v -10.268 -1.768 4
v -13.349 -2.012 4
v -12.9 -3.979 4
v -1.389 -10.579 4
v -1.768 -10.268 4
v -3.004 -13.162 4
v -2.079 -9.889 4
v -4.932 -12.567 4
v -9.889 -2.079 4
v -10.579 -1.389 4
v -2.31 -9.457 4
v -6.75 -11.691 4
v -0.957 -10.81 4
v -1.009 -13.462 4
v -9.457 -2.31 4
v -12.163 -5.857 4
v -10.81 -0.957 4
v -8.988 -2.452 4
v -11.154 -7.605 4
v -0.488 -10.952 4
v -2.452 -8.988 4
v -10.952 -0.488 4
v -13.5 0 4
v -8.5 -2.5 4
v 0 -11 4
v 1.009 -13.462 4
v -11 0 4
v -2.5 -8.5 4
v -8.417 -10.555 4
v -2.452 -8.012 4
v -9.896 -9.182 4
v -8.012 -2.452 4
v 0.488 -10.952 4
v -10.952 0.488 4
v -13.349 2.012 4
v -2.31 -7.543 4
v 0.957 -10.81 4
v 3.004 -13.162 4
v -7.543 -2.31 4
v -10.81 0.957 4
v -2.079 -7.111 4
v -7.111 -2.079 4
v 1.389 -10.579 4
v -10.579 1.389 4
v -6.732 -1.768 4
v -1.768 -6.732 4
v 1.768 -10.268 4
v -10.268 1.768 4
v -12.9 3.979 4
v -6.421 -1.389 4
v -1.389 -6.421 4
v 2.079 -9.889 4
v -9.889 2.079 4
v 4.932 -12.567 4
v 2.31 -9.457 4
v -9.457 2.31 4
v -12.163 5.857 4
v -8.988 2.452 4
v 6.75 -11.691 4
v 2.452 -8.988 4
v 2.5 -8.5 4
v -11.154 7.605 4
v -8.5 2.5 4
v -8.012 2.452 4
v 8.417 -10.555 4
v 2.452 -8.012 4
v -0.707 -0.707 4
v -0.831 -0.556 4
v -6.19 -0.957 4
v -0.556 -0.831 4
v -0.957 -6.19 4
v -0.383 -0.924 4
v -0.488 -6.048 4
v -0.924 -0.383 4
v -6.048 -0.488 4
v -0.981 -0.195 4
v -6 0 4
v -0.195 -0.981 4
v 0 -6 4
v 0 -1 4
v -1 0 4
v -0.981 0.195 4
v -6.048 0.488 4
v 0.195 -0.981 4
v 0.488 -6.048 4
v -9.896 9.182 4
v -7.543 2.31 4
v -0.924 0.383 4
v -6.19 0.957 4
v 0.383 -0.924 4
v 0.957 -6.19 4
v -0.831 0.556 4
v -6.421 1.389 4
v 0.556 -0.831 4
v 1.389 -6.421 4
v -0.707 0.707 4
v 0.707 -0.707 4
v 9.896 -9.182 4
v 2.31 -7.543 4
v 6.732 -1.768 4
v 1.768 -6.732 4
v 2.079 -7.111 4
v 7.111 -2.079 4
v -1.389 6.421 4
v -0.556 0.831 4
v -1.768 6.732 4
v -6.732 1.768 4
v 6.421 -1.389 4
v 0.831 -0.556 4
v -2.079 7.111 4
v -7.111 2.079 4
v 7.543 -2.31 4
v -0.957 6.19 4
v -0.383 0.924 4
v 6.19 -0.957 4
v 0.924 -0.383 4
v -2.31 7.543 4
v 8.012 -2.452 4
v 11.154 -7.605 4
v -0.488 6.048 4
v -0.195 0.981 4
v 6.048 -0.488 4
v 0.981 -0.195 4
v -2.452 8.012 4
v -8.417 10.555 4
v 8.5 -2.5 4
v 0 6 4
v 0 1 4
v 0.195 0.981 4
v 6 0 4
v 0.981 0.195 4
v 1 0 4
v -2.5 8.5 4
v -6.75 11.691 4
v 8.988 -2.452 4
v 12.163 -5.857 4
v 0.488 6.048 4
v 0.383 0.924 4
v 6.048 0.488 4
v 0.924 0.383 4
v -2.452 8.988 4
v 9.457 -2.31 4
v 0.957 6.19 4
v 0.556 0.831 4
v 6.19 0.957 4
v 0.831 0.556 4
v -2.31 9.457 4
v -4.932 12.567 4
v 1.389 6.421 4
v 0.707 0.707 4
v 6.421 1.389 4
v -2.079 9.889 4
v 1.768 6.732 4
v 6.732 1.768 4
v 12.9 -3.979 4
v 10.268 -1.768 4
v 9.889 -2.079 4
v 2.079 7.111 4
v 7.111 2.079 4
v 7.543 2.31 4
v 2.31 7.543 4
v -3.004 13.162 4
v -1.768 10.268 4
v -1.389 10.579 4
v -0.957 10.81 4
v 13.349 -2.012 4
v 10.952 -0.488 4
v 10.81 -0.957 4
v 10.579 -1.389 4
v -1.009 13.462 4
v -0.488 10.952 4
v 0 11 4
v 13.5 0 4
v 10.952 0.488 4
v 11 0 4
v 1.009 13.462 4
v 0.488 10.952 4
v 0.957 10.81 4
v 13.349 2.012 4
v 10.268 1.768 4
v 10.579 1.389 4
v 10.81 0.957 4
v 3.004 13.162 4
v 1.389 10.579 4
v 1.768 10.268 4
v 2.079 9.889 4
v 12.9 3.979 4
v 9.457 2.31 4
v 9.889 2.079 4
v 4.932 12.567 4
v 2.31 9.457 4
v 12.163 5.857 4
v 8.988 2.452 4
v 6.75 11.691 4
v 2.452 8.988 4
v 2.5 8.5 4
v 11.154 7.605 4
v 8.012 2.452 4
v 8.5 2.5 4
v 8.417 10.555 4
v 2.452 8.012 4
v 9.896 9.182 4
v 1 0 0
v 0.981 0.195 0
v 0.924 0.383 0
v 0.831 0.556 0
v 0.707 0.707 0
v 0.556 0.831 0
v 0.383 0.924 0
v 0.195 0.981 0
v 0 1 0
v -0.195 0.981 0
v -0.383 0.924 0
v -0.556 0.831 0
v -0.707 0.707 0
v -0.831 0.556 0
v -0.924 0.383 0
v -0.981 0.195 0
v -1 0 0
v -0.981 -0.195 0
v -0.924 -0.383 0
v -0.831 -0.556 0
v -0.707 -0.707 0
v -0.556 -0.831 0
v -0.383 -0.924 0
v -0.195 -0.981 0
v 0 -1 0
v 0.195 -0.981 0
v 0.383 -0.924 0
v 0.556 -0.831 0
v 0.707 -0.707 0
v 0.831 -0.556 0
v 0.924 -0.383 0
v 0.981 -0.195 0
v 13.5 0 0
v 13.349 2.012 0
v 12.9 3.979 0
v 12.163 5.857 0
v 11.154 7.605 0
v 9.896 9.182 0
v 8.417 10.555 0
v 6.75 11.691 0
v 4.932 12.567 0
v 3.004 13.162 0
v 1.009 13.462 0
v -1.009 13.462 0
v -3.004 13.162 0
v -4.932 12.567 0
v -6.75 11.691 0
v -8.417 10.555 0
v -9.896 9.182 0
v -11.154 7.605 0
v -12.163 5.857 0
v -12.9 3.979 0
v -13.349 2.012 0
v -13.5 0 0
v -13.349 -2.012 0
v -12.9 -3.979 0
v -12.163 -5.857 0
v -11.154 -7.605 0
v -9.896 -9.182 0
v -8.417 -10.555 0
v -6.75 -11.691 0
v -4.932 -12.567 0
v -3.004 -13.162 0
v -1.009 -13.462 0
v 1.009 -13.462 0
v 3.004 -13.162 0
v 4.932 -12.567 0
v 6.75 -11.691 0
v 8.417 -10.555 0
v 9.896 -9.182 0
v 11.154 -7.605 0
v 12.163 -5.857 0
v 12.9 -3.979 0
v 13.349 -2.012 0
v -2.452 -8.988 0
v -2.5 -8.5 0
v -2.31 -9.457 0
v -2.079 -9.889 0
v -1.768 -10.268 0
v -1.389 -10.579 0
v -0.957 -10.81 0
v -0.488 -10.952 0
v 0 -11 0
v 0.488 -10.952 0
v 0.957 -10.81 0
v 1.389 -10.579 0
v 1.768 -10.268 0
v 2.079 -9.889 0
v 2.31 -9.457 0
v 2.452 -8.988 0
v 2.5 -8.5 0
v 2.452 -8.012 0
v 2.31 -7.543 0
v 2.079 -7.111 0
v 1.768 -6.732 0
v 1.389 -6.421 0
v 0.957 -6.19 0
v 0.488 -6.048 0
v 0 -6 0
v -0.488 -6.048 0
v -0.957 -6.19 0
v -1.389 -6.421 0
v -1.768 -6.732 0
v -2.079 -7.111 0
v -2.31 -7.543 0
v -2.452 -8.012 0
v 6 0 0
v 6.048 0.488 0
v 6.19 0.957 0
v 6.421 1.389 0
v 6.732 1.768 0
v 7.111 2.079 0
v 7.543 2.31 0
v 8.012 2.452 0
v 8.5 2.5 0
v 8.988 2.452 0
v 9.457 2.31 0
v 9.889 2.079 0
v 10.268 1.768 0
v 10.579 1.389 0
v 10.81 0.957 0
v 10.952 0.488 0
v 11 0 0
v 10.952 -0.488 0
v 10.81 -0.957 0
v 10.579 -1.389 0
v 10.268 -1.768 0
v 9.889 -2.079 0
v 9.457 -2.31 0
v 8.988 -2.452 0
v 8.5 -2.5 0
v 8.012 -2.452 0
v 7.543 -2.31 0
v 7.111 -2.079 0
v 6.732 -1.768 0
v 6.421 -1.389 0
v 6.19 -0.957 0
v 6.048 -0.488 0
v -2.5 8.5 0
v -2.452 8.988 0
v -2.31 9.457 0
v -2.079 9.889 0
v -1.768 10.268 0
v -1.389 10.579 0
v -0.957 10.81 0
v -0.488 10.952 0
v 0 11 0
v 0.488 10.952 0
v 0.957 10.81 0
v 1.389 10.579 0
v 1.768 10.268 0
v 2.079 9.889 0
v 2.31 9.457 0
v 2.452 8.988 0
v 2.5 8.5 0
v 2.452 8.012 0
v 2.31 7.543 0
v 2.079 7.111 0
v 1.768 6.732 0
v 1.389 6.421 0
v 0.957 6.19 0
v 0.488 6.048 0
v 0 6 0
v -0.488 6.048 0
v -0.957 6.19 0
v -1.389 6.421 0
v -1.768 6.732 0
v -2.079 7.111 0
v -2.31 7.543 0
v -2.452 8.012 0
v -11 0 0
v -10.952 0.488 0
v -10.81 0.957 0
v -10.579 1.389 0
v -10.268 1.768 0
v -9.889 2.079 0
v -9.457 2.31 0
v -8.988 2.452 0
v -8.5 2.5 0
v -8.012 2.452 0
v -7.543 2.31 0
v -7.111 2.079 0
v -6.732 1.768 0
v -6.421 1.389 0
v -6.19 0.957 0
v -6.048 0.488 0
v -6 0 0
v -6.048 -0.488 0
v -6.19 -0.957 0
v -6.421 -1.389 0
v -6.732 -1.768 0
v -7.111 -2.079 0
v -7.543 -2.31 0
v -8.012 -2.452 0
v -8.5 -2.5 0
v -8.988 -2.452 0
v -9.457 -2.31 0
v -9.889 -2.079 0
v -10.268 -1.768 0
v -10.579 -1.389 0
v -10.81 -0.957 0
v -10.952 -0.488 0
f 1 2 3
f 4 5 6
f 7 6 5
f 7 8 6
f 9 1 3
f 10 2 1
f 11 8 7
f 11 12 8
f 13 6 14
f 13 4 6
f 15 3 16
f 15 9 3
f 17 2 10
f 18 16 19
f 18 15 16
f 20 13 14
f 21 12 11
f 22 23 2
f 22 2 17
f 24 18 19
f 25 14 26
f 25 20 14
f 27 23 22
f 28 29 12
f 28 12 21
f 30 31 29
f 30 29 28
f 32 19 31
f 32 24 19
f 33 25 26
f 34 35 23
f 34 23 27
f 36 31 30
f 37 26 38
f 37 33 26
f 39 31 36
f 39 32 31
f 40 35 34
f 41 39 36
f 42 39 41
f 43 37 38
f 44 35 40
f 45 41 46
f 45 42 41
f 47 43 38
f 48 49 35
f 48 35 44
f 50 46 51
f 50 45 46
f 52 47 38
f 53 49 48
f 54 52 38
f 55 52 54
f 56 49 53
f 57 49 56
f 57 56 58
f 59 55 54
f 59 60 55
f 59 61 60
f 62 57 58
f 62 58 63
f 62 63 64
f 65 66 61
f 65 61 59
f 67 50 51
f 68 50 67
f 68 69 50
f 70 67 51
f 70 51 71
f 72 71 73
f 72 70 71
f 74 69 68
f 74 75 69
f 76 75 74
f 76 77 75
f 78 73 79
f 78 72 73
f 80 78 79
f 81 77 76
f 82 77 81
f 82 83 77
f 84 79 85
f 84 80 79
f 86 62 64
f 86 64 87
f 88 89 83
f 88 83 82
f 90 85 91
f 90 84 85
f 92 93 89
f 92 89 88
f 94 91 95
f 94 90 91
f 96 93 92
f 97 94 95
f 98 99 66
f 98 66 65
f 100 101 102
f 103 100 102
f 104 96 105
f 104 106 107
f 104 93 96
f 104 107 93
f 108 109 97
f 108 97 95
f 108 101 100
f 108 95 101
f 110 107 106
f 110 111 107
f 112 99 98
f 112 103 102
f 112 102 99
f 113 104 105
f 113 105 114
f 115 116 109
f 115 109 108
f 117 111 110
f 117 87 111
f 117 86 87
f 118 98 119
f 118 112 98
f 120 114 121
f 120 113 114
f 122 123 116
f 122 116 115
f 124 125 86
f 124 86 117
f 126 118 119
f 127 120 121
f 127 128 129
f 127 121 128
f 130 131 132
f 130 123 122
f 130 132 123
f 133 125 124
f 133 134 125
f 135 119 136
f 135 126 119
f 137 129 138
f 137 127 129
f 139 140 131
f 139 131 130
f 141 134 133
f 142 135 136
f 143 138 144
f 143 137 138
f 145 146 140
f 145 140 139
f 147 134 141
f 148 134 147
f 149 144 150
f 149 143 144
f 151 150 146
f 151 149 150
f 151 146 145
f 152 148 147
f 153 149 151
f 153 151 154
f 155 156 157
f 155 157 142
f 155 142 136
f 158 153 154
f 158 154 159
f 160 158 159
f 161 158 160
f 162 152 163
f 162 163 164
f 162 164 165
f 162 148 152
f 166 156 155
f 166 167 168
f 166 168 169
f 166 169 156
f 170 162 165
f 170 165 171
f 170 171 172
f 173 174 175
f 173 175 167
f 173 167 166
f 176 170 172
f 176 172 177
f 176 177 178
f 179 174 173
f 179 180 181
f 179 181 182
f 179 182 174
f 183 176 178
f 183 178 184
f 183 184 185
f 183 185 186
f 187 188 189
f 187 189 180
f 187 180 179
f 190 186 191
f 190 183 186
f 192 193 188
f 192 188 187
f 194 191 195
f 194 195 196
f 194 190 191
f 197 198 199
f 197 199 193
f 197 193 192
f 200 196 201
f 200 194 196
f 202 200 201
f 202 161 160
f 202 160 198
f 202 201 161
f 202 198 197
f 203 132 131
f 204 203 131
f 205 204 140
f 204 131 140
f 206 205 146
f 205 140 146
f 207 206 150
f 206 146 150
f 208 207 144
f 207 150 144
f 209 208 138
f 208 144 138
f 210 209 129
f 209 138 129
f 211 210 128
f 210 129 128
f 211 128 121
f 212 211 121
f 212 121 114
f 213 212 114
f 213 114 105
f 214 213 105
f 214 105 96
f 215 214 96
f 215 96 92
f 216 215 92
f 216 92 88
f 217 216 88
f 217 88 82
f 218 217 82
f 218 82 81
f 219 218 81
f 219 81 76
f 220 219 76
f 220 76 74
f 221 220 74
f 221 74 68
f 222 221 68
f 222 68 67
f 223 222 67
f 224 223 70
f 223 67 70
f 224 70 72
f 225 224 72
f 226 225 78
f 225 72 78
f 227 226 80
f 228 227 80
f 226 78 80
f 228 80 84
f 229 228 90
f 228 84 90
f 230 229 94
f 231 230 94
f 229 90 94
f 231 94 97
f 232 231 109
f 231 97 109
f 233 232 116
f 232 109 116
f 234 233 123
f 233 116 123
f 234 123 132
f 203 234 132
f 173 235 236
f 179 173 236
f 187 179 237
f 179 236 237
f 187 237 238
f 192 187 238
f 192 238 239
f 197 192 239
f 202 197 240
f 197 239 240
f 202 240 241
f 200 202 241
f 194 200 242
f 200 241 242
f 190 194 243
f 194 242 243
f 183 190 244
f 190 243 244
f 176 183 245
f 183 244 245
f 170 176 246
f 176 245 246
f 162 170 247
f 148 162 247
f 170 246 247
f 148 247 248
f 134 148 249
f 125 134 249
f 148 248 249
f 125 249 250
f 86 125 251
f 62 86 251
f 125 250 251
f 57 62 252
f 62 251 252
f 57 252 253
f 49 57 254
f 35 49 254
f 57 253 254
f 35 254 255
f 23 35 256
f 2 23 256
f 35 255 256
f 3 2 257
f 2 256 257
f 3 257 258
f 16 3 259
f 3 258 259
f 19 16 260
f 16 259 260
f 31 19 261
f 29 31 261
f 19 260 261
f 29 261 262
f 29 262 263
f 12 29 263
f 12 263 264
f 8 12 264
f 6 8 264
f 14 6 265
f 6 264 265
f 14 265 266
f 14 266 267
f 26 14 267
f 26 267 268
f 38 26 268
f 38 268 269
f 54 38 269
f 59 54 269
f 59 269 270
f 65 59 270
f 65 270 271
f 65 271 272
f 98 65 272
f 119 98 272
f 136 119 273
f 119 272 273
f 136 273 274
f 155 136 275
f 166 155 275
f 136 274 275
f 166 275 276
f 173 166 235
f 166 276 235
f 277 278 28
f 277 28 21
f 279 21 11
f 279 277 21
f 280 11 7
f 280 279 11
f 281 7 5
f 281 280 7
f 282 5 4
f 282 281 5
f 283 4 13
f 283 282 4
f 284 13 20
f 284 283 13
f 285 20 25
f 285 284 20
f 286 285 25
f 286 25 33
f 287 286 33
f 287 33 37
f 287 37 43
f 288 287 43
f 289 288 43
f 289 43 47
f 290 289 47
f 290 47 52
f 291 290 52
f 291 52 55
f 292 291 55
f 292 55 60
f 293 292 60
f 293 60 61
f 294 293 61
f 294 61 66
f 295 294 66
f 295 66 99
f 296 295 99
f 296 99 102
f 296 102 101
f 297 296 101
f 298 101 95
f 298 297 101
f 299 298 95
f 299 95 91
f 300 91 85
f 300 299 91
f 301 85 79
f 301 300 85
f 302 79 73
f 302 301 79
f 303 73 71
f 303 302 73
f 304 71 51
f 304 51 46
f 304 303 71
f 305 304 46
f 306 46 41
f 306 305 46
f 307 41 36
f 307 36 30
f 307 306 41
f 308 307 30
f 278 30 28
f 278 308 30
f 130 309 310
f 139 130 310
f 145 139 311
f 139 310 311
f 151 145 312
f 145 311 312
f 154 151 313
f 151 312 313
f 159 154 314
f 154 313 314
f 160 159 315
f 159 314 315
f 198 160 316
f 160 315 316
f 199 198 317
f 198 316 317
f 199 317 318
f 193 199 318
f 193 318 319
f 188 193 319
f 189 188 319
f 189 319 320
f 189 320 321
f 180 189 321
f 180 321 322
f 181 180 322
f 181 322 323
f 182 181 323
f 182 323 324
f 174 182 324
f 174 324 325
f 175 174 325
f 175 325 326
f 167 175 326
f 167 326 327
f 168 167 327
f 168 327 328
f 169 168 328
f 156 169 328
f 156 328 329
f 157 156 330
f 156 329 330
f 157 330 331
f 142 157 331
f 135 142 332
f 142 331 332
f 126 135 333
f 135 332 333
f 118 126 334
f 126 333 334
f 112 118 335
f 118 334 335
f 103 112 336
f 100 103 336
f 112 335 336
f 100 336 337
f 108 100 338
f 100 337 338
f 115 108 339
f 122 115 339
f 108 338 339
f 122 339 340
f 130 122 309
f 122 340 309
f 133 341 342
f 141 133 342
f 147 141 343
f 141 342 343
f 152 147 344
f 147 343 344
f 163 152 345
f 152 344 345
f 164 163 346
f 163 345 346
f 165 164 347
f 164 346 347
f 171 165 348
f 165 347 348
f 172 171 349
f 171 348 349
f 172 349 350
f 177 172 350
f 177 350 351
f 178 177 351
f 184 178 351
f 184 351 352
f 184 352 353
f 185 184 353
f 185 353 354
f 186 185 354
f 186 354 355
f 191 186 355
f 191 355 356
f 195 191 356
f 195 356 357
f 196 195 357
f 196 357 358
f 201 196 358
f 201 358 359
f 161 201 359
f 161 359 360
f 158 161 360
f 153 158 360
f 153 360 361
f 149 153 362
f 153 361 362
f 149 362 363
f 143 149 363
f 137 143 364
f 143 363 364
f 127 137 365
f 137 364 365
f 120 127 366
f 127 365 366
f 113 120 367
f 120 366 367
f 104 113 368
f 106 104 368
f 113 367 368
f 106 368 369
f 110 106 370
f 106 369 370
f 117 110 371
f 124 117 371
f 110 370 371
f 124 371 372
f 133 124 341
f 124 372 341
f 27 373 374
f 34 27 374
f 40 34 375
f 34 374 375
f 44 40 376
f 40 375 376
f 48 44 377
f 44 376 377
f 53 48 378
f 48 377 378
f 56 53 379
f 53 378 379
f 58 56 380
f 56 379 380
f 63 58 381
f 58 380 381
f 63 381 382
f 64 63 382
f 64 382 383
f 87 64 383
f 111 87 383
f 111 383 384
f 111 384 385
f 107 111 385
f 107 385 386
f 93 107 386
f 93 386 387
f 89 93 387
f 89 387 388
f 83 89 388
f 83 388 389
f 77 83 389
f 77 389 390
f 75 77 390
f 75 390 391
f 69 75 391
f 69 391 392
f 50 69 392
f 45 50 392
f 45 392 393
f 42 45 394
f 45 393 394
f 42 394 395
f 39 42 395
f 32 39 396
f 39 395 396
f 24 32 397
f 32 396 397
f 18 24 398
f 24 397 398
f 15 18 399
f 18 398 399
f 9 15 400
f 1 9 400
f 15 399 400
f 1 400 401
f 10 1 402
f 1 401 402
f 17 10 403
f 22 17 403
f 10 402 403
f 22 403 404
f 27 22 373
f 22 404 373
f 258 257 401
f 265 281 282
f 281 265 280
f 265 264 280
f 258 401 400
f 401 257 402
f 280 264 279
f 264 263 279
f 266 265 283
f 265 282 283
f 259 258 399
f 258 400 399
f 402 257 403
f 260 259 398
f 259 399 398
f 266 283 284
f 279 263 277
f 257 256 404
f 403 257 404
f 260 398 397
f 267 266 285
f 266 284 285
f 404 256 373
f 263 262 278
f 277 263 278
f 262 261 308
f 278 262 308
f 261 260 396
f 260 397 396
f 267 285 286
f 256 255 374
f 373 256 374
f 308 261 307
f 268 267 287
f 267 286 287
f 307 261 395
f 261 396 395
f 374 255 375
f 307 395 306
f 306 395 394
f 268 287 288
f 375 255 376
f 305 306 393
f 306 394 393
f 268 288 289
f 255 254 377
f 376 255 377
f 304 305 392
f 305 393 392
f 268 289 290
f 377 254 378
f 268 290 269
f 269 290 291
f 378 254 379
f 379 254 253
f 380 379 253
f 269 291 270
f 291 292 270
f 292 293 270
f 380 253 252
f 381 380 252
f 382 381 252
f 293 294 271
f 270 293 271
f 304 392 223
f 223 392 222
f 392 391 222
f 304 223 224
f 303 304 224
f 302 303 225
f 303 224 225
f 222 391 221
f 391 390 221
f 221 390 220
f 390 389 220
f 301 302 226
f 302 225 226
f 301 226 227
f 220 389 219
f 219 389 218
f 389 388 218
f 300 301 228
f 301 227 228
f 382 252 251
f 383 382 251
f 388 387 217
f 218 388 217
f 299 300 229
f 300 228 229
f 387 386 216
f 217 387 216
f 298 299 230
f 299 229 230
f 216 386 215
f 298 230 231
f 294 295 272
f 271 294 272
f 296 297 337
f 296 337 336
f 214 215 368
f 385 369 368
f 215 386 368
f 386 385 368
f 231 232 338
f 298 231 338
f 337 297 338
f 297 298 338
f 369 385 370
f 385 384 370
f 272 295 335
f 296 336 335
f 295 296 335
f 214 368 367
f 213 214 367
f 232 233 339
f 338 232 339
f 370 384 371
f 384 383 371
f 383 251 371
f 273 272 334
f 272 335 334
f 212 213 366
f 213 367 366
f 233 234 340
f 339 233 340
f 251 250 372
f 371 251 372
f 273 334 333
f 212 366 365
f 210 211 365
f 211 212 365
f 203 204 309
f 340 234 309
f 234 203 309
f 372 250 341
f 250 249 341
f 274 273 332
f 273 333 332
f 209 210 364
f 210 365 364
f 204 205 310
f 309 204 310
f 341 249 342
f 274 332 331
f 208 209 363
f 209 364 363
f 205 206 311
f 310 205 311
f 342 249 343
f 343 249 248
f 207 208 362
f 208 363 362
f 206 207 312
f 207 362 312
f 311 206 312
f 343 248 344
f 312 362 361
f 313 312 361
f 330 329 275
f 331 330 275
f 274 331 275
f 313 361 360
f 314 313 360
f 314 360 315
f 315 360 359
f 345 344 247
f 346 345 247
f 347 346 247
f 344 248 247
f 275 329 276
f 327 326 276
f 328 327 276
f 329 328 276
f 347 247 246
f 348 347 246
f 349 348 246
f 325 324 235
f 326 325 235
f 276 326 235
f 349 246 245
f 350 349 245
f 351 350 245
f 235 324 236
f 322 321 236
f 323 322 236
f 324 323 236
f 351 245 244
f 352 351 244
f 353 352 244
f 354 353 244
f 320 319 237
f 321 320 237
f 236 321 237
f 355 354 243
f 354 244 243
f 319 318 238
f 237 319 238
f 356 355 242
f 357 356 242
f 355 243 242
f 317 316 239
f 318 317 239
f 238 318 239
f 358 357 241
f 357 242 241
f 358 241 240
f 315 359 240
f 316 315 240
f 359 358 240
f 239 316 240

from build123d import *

# Parameters (mm, degrees)
SKETCH1_R           = 13.5
BOSS_EXTRUDE1_DEPTH = 4
CUT_EXTRUDE1_REACH  = 21.506
SKETCH2_R           = 1
CUT_EXTRUDE2_REACH  = 21.506
SKETCH3_R           = 2.5
CUT_EXTRUDE3_REACH  = 21.506
SKETCH4_R           = 2.5
CUT_EXTRUDE4_REACH  = 21.506
SKETCH5_R           = 2.5


with BuildPart() as part:
    # Sketch1 → Boss-Extrude1 (new body)
    with BuildSketch(Plane.XY):
        Circle(SKETCH1_R)
    extrude(amount=BOSS_EXTRUDE1_DEPTH)

    # Sketch2 → Cut-Extrude1 (cut, up to next)
    with BuildSketch(Plane.XY.offset(4), mode=Mode.PRIVATE) as cut_extrude1_sk1:
        Circle(SKETCH2_R)
    cut_extrude1_tool1 = extrude(cut_extrude1_sk1.sketch, amount=-CUT_EXTRUDE1_REACH, mode=Mode.PRIVATE) & part.part
    add(cut_extrude1_tool1.solids().sort_by_distance((0, 0, 4))[0], mode=Mode.SUBTRACT)

    # Sketch3 → Cut-Extrude2 (cut, up to next)
    with BuildSketch(Plane(origin=(0, 0, 0), x_dir=(-1, 0, 0), z_dir=(0, 0, -1)), mode=Mode.PRIVATE) as cut_extrude2_sk1:
        with Locations((0, 8.5)):
            Circle(SKETCH3_R)
    cut_extrude2_tool1 = extrude(cut_extrude2_sk1.sketch, amount=-CUT_EXTRUDE2_REACH, mode=Mode.PRIVATE) & part.part
    cut_extrude2 = cut_extrude2_tool1.solids().sort_by_distance((0, 8.5, 0))[0]
    add(cut_extrude2, mode=Mode.SUBTRACT)

    # Mirror1: Cut-Extrude2 across plane
    add(cut_extrude2.mirror(Plane.ZX), mode=Mode.SUBTRACT)

    # Sketch4 → Cut-Extrude3 (cut, up to next)
    with BuildSketch(Plane(origin=(0, 0, 0), x_dir=(-1, 0, 0), z_dir=(0, 0, -1)), mode=Mode.PRIVATE) as cut_extrude3_sk1:
        with Locations((8.5, 0)):
            Circle(SKETCH4_R)
    cut_extrude3_tool1 = extrude(cut_extrude3_sk1.sketch, amount=-CUT_EXTRUDE3_REACH, mode=Mode.PRIVATE) & part.part
    add(cut_extrude3_tool1.solids().sort_by_distance((-8.5, 0, 0))[0], mode=Mode.SUBTRACT)

    # Sketch5 → Cut-Extrude4 (cut, up to next)
    with BuildSketch(Plane(origin=(0, 0, 0), x_dir=(-1, 0, 0), z_dir=(0, 0, -1)), mode=Mode.PRIVATE) as cut_extrude4_sk1:
        with Locations((-8.5, 0)):
            Circle(SKETCH5_R)
    cut_extrude4_tool1 = extrude(cut_extrude4_sk1.sketch, amount=-CUT_EXTRUDE4_REACH, mode=Mode.PRIVATE) & part.part
    add(cut_extrude4_tool1.solids().sort_by_distance((8.5, 0, 0))[0], mode=Mode.SUBTRACT)


solid = part.part
